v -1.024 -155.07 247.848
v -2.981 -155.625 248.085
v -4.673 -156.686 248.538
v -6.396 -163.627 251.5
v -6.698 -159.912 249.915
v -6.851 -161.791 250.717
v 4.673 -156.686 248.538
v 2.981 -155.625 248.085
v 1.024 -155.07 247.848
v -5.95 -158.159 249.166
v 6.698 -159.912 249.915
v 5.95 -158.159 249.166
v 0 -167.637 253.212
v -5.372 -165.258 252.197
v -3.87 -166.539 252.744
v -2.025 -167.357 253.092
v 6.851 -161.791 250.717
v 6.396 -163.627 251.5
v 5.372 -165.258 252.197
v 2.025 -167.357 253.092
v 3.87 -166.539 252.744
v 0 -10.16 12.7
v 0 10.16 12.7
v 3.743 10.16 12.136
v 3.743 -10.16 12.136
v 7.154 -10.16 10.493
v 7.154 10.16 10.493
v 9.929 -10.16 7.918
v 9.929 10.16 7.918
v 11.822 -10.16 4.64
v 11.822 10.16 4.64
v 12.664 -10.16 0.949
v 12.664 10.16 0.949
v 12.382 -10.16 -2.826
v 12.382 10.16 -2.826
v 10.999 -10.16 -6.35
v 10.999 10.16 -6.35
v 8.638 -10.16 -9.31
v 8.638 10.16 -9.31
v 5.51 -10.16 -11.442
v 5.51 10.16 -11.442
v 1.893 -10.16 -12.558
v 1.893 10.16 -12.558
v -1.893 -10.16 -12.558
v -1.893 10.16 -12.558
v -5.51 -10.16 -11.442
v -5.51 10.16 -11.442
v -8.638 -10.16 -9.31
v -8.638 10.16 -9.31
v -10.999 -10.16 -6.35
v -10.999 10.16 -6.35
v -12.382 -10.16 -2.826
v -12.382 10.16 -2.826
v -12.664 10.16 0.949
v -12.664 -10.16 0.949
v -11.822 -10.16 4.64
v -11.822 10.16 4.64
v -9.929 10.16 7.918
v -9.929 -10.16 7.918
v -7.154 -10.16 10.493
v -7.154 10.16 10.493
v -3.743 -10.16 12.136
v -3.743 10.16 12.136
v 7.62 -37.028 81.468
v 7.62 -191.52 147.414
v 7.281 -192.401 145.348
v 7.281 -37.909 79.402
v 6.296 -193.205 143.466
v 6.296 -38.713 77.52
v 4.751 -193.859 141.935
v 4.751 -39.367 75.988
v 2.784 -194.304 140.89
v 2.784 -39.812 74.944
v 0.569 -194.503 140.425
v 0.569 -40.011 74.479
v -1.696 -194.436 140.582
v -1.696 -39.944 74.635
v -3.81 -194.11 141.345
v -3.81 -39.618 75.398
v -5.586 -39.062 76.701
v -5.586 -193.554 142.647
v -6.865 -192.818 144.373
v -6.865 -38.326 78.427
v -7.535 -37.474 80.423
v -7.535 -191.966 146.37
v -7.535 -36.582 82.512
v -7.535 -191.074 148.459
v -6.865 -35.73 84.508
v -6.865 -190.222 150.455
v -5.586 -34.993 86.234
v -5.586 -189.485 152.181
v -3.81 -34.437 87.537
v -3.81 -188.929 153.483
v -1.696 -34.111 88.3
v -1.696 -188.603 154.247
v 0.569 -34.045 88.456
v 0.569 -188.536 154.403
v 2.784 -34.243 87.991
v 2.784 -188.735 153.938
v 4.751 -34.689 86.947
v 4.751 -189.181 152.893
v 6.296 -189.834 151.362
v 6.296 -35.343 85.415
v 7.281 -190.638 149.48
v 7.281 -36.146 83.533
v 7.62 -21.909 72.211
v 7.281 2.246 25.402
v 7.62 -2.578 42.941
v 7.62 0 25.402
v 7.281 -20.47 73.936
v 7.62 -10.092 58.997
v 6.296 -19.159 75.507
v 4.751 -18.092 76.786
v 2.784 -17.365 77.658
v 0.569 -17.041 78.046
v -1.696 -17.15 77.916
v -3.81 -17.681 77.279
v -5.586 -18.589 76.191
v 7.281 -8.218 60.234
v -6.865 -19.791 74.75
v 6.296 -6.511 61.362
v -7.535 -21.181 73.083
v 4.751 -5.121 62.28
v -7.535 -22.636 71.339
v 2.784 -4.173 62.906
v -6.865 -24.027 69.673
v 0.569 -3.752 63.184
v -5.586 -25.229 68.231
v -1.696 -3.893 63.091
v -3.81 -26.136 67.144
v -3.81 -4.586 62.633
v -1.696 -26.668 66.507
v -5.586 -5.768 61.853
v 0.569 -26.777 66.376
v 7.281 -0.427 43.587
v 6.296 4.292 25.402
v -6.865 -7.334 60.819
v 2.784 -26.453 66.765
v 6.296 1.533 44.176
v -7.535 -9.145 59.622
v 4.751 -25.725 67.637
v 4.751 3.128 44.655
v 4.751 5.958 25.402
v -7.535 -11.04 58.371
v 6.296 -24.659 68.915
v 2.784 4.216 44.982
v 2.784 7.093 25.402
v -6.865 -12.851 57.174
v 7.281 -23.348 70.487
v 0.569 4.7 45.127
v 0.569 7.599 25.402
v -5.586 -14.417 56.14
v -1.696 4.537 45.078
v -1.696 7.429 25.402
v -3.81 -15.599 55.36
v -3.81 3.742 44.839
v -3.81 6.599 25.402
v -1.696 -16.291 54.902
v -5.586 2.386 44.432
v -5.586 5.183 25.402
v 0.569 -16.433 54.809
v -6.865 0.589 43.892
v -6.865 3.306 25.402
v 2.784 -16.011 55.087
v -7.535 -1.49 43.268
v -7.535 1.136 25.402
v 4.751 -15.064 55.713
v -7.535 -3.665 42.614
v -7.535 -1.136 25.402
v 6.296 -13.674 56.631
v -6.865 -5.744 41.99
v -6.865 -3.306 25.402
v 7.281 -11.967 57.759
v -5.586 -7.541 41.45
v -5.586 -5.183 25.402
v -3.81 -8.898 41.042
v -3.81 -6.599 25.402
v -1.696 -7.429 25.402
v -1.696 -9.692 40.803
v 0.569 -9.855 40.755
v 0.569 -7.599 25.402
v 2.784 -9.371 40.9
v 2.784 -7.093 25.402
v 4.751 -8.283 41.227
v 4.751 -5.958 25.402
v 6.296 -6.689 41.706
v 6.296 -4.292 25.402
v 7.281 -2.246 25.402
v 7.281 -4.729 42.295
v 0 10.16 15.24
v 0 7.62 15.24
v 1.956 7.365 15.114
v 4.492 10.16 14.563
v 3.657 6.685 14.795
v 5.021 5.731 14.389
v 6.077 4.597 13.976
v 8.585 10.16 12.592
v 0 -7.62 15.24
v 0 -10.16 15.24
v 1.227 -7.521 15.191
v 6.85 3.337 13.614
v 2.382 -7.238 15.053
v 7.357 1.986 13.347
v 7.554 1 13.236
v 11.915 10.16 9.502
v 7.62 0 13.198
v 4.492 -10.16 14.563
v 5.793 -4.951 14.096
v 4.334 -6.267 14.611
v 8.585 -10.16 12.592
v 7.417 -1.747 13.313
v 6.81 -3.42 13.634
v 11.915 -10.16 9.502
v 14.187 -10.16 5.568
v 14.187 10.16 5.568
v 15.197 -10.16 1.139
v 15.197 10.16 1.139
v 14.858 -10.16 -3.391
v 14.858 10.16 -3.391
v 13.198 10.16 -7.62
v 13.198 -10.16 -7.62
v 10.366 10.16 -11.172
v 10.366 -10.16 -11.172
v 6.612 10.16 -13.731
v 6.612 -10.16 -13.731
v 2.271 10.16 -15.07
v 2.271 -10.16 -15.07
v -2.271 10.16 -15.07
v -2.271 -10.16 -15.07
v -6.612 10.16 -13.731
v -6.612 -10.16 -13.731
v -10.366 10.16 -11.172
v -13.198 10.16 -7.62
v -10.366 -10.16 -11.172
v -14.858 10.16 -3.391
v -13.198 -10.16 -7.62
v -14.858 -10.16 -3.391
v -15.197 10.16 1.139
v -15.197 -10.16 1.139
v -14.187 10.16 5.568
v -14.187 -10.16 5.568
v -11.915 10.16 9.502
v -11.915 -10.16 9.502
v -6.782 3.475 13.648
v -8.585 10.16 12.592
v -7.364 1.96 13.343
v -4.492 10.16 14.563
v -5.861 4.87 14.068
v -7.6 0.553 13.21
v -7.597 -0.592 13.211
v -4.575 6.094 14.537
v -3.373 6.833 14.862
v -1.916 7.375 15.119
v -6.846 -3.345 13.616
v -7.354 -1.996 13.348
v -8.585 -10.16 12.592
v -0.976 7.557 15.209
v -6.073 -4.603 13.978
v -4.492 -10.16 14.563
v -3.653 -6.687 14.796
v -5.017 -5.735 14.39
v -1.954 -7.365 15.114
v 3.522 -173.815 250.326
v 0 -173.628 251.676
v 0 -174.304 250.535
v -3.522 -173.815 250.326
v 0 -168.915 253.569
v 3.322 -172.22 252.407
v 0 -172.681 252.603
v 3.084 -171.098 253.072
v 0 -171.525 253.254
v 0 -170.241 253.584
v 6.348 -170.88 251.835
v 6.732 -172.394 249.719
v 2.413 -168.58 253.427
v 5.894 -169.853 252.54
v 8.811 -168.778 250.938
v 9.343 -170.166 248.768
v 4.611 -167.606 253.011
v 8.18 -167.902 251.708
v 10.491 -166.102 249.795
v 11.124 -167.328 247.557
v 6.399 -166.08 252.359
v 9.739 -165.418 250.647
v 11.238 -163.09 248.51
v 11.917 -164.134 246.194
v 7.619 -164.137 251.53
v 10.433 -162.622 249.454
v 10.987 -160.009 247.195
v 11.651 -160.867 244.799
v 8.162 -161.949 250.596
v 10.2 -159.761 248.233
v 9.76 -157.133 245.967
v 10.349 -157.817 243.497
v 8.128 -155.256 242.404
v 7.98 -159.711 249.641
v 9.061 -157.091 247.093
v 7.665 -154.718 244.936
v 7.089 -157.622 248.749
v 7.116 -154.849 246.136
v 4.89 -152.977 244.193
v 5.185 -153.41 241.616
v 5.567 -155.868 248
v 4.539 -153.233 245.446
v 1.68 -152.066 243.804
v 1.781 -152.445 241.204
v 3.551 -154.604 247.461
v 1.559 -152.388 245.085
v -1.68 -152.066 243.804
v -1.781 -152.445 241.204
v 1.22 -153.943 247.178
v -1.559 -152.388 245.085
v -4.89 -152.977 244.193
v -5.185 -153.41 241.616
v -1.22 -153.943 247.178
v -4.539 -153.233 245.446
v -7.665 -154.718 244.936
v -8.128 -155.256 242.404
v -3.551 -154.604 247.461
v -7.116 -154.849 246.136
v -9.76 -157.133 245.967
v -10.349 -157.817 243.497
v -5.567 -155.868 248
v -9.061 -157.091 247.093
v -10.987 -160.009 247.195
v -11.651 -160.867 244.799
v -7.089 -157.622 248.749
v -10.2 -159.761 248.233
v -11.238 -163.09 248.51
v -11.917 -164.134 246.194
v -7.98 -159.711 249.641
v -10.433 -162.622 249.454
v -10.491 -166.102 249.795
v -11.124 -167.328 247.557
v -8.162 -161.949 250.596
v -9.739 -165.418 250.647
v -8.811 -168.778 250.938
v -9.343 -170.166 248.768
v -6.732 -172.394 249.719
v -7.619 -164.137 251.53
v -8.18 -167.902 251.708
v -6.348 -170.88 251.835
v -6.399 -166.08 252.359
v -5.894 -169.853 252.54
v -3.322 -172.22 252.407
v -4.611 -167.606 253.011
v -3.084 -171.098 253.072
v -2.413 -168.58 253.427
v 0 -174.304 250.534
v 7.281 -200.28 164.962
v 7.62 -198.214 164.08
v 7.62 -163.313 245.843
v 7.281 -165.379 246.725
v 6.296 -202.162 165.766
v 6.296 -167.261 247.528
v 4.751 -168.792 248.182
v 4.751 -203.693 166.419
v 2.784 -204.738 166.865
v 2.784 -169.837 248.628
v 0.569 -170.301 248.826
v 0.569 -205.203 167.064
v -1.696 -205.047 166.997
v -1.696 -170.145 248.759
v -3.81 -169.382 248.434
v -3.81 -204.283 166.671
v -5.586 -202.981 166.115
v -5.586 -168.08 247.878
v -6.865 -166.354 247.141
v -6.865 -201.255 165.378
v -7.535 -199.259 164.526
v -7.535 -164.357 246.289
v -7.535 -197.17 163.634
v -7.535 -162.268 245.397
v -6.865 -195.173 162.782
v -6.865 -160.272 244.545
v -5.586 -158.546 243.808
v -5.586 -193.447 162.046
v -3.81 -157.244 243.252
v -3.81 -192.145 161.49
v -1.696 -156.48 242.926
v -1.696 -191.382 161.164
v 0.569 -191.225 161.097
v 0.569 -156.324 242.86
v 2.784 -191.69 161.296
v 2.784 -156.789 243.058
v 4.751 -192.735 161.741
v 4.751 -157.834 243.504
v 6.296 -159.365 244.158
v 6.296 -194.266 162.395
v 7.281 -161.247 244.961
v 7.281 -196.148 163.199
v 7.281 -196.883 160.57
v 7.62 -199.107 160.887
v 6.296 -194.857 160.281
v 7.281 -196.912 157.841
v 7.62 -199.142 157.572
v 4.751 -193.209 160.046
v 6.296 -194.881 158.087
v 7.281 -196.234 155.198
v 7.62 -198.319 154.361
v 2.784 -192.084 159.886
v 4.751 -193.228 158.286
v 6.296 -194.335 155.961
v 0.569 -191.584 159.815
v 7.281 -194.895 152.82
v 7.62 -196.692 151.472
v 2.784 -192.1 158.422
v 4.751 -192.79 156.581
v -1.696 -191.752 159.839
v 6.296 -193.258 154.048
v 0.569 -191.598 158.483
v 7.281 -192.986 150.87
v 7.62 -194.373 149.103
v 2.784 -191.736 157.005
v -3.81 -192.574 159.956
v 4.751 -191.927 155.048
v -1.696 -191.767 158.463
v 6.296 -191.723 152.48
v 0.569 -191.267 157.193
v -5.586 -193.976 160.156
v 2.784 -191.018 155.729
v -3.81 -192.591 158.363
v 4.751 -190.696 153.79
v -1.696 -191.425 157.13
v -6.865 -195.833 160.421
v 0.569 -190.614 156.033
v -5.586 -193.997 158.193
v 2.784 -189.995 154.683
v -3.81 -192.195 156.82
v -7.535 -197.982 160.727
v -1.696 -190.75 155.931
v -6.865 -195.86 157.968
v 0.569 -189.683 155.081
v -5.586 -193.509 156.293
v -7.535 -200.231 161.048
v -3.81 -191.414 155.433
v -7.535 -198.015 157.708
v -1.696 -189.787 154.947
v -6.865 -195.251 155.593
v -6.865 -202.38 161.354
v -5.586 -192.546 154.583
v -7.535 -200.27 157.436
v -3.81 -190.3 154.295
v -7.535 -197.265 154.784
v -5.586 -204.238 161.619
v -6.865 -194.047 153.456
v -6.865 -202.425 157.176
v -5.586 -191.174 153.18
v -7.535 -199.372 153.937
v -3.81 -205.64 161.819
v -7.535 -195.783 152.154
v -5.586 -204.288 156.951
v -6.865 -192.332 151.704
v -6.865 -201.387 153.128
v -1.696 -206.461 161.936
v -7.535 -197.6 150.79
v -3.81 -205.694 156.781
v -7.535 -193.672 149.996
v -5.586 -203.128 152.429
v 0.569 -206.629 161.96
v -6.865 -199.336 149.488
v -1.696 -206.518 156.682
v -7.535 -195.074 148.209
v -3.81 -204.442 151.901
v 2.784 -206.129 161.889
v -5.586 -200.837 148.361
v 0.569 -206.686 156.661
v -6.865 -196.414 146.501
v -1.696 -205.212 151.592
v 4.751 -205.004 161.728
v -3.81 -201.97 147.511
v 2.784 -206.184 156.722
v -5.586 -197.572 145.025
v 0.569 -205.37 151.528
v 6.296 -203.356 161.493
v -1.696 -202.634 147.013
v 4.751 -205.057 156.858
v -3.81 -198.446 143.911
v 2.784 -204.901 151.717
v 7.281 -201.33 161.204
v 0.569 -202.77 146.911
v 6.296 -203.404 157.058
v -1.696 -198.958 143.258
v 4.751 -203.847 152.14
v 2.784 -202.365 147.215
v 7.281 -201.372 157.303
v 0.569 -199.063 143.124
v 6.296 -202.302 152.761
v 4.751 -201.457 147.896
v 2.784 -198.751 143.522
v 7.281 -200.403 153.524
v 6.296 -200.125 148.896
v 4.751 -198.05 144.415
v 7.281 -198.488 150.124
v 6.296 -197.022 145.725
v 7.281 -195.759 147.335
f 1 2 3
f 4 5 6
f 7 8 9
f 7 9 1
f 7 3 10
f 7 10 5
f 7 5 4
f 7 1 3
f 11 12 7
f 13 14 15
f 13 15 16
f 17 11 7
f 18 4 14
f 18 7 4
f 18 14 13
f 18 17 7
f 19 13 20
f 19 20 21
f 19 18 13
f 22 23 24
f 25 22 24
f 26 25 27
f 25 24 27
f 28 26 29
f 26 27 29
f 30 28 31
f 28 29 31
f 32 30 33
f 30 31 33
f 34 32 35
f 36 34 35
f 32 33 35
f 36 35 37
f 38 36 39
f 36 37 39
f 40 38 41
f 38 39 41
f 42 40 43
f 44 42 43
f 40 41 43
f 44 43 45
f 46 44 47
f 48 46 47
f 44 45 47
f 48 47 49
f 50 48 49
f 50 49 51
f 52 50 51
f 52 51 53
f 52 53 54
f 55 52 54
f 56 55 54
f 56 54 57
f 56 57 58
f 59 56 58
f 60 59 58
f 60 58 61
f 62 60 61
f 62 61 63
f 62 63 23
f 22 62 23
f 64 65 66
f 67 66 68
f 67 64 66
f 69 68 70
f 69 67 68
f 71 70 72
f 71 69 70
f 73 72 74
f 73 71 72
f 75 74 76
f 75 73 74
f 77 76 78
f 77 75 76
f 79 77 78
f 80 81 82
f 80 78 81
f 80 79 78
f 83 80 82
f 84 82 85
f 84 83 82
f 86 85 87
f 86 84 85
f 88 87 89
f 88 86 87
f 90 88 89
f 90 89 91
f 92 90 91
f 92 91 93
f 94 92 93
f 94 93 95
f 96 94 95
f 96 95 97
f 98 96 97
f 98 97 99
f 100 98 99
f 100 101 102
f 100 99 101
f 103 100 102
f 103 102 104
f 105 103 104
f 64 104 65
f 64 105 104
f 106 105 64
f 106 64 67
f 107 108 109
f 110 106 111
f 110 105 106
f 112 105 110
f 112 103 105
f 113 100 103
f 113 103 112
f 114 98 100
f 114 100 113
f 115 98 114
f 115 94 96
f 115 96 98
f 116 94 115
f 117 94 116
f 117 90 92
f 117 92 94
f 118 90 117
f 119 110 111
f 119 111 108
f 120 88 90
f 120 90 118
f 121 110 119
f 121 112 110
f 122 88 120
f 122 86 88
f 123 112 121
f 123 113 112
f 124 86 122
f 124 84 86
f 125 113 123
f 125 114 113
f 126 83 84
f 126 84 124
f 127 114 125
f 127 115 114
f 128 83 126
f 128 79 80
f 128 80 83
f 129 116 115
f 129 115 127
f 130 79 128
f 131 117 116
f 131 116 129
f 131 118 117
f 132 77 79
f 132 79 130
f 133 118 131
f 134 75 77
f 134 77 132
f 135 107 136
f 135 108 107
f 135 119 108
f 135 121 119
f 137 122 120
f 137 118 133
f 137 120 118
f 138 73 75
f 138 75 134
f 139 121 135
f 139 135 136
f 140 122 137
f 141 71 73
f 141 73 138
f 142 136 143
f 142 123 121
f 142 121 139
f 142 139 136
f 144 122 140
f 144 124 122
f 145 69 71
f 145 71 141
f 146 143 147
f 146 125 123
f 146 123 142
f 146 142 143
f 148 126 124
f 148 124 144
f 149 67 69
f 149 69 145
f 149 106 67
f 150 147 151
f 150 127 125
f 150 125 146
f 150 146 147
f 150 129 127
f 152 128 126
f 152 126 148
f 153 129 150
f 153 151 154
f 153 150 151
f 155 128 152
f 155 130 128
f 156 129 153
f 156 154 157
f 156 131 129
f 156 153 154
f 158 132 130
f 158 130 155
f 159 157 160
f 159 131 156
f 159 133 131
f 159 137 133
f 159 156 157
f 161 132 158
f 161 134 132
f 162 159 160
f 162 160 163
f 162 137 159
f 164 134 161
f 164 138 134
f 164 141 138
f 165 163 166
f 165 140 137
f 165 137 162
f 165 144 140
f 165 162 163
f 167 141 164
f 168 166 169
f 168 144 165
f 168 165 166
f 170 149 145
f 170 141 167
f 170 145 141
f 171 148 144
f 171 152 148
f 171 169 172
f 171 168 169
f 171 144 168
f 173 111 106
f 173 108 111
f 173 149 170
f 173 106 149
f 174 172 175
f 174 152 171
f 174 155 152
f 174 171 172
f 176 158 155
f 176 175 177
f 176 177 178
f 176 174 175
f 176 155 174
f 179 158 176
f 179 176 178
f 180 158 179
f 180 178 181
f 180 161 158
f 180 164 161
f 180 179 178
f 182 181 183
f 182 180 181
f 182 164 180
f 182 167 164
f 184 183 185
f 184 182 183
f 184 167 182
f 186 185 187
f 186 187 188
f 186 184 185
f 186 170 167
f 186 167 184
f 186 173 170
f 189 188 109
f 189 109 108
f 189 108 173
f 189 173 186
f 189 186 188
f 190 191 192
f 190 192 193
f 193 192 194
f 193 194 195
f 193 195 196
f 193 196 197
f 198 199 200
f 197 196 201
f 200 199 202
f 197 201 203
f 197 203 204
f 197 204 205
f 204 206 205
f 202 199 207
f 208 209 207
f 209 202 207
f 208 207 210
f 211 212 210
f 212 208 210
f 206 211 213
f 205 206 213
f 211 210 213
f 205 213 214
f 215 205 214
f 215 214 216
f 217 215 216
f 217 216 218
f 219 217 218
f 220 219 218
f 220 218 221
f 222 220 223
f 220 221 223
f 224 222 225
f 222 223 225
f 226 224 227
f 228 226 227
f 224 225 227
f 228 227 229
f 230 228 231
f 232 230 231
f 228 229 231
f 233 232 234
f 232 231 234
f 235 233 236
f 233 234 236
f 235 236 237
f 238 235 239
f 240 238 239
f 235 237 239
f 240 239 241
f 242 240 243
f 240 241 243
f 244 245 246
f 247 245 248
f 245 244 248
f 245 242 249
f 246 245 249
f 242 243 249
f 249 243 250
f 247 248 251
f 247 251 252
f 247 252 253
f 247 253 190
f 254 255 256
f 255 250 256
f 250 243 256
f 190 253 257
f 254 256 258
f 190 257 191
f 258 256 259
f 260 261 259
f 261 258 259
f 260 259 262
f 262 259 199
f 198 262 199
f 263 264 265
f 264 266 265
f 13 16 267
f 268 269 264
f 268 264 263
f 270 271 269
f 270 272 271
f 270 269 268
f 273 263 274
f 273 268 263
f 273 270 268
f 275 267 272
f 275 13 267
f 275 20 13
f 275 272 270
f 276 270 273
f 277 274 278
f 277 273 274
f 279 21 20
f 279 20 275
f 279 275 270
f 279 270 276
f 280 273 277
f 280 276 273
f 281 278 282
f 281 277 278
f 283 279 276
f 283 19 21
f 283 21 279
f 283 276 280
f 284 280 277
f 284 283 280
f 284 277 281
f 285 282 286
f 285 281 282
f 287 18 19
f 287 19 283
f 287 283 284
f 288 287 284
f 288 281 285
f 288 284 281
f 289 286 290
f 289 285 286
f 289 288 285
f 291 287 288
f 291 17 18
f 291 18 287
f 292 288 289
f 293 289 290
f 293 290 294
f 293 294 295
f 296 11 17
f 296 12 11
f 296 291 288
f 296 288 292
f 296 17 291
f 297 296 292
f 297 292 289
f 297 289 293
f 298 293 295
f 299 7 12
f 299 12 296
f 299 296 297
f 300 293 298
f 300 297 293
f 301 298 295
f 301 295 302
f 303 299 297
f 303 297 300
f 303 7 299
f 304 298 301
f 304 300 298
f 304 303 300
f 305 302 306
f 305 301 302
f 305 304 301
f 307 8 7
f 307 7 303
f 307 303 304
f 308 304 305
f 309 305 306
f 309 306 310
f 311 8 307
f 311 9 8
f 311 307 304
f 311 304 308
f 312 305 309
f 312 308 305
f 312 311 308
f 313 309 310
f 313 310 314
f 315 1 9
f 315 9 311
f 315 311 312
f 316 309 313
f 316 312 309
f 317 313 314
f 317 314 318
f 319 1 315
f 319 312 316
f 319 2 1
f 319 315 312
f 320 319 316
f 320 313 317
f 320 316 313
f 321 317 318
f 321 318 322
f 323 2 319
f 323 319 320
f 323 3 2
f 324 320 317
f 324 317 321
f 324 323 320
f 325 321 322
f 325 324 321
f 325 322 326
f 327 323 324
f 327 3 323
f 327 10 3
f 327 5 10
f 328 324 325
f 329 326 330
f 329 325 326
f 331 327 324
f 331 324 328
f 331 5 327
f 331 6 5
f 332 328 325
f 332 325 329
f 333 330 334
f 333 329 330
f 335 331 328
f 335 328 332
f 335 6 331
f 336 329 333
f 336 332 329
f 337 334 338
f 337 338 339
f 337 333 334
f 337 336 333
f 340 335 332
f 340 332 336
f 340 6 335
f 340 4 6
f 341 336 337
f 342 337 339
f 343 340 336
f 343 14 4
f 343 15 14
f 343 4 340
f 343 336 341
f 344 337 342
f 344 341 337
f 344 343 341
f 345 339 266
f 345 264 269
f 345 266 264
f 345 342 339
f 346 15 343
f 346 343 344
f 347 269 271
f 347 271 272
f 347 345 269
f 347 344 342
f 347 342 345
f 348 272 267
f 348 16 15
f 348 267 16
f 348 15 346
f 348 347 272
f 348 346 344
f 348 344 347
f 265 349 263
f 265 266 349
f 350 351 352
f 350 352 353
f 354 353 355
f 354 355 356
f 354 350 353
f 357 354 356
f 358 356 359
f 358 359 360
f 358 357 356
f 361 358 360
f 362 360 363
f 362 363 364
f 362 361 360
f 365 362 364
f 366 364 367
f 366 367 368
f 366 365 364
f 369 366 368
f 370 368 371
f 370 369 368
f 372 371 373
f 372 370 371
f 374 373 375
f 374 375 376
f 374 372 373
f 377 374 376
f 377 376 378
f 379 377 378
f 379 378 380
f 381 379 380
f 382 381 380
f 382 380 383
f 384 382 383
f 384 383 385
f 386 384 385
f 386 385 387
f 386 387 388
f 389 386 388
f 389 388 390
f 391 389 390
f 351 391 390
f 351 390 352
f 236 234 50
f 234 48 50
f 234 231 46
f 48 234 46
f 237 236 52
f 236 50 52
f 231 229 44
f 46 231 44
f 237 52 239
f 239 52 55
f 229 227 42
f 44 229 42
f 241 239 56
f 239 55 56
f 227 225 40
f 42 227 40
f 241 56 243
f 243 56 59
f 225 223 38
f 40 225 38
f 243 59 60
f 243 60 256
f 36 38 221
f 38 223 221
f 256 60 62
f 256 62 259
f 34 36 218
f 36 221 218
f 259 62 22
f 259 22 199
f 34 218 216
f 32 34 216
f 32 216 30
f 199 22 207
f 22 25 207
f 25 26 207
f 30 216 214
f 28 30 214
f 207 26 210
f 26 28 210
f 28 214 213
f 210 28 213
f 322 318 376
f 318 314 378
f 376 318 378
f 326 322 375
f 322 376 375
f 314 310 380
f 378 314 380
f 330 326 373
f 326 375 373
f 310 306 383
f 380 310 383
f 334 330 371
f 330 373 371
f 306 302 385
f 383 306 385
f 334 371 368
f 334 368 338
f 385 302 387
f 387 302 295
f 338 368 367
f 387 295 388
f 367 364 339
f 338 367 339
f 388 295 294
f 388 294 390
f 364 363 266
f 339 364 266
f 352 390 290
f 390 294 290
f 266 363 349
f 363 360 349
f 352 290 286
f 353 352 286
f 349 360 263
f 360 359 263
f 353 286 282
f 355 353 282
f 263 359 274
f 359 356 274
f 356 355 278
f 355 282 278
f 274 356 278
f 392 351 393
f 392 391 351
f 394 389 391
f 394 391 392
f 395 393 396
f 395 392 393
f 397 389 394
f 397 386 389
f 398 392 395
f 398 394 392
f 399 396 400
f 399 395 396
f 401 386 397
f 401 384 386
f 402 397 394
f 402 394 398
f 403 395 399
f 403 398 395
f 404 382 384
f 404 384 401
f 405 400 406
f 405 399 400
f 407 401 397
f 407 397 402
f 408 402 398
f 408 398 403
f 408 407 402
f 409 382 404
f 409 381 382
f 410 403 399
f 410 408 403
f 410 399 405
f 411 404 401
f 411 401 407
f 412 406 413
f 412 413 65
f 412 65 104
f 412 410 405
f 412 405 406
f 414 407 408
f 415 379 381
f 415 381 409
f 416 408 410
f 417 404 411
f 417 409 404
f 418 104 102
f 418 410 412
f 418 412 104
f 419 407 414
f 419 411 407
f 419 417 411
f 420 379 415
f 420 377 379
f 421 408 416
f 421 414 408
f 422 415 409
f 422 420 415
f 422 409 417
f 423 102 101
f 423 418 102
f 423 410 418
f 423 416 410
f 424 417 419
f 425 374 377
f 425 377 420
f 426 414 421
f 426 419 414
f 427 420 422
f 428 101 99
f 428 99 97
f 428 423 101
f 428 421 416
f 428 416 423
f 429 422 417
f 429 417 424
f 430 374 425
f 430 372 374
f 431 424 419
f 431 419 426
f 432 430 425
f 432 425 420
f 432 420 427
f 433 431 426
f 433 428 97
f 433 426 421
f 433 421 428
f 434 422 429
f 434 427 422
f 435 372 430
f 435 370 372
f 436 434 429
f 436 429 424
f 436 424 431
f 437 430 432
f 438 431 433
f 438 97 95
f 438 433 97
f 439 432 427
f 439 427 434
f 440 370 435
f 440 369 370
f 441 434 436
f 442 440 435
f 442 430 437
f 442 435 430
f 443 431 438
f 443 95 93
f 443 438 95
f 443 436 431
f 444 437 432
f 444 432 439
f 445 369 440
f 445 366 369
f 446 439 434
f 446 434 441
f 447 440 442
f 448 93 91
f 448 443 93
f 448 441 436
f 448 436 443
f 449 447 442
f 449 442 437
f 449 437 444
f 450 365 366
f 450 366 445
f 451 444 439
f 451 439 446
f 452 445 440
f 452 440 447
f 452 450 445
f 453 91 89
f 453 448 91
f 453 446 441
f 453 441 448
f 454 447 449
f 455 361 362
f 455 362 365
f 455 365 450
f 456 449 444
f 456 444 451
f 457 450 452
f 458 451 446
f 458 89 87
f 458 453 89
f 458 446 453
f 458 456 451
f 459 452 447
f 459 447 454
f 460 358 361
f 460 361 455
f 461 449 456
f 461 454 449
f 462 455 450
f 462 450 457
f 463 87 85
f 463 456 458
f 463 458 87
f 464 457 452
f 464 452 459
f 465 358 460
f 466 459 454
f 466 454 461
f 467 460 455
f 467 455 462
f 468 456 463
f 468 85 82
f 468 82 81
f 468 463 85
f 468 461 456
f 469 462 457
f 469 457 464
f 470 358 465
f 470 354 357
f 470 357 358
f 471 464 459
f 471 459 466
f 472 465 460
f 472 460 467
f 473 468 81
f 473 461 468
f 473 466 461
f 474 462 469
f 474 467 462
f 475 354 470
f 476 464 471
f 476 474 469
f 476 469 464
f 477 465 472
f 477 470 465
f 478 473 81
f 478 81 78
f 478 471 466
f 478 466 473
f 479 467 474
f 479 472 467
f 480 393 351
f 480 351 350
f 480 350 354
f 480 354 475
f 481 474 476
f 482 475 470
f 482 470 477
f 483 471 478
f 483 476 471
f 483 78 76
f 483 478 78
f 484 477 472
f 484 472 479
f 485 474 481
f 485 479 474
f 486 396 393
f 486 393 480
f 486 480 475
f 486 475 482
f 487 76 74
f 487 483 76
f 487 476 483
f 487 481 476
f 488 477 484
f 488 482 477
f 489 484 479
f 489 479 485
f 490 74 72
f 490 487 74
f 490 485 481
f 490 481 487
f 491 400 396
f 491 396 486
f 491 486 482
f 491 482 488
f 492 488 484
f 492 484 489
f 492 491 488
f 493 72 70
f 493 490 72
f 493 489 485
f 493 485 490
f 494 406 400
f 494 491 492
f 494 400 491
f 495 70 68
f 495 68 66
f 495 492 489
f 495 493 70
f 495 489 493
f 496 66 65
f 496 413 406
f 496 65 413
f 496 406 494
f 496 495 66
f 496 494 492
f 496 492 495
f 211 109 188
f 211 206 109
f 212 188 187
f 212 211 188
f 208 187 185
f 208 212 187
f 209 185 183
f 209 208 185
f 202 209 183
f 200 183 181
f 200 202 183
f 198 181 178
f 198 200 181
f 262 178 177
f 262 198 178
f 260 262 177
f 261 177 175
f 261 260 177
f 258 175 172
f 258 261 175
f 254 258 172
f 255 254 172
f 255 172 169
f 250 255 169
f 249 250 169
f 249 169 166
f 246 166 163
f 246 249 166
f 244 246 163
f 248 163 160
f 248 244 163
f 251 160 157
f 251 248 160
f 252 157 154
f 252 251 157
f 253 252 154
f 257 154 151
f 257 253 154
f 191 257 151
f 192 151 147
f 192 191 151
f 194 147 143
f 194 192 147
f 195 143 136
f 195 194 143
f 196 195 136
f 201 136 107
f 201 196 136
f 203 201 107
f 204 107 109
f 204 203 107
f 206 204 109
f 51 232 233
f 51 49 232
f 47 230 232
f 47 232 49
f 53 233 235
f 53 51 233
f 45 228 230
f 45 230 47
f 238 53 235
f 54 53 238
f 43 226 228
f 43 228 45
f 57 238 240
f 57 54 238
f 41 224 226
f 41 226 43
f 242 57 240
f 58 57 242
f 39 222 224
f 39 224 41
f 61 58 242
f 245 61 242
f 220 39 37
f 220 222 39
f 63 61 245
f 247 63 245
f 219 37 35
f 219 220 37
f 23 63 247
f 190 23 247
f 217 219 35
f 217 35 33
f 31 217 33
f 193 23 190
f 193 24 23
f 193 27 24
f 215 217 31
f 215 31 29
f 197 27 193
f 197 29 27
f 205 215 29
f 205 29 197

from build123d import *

# Parameters (mm, degrees)
SKETCH2_R                = 7.62
SKETCH4_R                = 11.950330427
BOSS_EXTRUDE1_DEPTH      = 5.08
FILLET1_R                = 5.08
BOSS_EXTRUDE2_DEPTH      = 10.16
BOSS_EXTRUDE2_DEPTH_BACK = 10.16
SKETCH5_R                = 15.24
SKETCH6_R                = 12.7
CUT_EXTRUDE1_DEPTH       = 335.141301153


with BuildPart() as part:
    # Sweep1: sweep along a path in Sketch1
    with BuildLine(Plane(origin=(0, 0, 0), x_dir=(0, 0, -1), z_dir=(1, 0, 0))) as sweep1_path:
        Line((-245.842907084, -163.312870299), (-164.080363385, -198.214108787))
        ThreePointArc((-164.080363385, -198.214108787), (-154.360765503, -198.318567045), (-147.414108787, -191.519636615))
        Line((-147.414108787, -191.519636615), (-81.467540759, -37.02772218))
        ThreePointArc((-81.467540759, -37.02772218), (-58.996512939, -10.092361683), (-25.401796509, 0))
        Line((-25.401796509, 0), (0, 0))
    # Sketch2 → Sweep1 (sweep)
    with BuildSketch(Plane.XY):
        Circle(SKETCH2_R)
    sweep(path=sweep1_path.line)

    # Sketch4 → Boss-Extrude1 (add)
    with BuildSketch(Plane(origin=(0, 63.595671041, 148.98450765), x_dir=(1, 0, 0), z_dir=(0, 0.39258985925704815, 0.9197136523986861))):
        with Locations(Location((0, -246.716508718, 0), (0, 0, 270))):
            Circle(SKETCH4_R)
    extrude(amount=BOSS_EXTRUDE1_DEPTH)

    # Fillet1
    fillet1_edges = [part.edges().sort_by_distance(p)[0] for p in [
        (0, -150.32763177, 245.823473898),
    ]]
    fillet(fillet1_edges, radius=FILLET1_R - 0.0001)  # a hair under: the kernel refuses the full size

    # Sketch5 → Boss-Extrude2 (add, two sides: drawn at the far end of the back side and taken through both)
    with BuildSketch(Plane(origin=(0, 0, 0), x_dir=(1, 0, 0), z_dir=(0, 1, 0)).offset(-BOSS_EXTRUDE2_DEPTH_BACK)):
        with Locations(Location((0, 0, 0), (0, 0, 270))):
            Circle(SKETCH5_R)
    extrude(amount=BOSS_EXTRUDE2_DEPTH + BOSS_EXTRUDE2_DEPTH_BACK)

    # Sketch6 → Cut-Extrude1 (cut, through all)
    with BuildSketch(Plane(origin=(0, 10.16, 0), x_dir=(1, 0, 0), z_dir=(0, 1, 0))):
        with Locations(Location((0, 0, 0), (0, 0, 270))):
            Circle(SKETCH6_R)
    extrude(amount=-CUT_EXTRUDE1_DEPTH, mode=Mode.SUBTRACT)


solid = part.part
